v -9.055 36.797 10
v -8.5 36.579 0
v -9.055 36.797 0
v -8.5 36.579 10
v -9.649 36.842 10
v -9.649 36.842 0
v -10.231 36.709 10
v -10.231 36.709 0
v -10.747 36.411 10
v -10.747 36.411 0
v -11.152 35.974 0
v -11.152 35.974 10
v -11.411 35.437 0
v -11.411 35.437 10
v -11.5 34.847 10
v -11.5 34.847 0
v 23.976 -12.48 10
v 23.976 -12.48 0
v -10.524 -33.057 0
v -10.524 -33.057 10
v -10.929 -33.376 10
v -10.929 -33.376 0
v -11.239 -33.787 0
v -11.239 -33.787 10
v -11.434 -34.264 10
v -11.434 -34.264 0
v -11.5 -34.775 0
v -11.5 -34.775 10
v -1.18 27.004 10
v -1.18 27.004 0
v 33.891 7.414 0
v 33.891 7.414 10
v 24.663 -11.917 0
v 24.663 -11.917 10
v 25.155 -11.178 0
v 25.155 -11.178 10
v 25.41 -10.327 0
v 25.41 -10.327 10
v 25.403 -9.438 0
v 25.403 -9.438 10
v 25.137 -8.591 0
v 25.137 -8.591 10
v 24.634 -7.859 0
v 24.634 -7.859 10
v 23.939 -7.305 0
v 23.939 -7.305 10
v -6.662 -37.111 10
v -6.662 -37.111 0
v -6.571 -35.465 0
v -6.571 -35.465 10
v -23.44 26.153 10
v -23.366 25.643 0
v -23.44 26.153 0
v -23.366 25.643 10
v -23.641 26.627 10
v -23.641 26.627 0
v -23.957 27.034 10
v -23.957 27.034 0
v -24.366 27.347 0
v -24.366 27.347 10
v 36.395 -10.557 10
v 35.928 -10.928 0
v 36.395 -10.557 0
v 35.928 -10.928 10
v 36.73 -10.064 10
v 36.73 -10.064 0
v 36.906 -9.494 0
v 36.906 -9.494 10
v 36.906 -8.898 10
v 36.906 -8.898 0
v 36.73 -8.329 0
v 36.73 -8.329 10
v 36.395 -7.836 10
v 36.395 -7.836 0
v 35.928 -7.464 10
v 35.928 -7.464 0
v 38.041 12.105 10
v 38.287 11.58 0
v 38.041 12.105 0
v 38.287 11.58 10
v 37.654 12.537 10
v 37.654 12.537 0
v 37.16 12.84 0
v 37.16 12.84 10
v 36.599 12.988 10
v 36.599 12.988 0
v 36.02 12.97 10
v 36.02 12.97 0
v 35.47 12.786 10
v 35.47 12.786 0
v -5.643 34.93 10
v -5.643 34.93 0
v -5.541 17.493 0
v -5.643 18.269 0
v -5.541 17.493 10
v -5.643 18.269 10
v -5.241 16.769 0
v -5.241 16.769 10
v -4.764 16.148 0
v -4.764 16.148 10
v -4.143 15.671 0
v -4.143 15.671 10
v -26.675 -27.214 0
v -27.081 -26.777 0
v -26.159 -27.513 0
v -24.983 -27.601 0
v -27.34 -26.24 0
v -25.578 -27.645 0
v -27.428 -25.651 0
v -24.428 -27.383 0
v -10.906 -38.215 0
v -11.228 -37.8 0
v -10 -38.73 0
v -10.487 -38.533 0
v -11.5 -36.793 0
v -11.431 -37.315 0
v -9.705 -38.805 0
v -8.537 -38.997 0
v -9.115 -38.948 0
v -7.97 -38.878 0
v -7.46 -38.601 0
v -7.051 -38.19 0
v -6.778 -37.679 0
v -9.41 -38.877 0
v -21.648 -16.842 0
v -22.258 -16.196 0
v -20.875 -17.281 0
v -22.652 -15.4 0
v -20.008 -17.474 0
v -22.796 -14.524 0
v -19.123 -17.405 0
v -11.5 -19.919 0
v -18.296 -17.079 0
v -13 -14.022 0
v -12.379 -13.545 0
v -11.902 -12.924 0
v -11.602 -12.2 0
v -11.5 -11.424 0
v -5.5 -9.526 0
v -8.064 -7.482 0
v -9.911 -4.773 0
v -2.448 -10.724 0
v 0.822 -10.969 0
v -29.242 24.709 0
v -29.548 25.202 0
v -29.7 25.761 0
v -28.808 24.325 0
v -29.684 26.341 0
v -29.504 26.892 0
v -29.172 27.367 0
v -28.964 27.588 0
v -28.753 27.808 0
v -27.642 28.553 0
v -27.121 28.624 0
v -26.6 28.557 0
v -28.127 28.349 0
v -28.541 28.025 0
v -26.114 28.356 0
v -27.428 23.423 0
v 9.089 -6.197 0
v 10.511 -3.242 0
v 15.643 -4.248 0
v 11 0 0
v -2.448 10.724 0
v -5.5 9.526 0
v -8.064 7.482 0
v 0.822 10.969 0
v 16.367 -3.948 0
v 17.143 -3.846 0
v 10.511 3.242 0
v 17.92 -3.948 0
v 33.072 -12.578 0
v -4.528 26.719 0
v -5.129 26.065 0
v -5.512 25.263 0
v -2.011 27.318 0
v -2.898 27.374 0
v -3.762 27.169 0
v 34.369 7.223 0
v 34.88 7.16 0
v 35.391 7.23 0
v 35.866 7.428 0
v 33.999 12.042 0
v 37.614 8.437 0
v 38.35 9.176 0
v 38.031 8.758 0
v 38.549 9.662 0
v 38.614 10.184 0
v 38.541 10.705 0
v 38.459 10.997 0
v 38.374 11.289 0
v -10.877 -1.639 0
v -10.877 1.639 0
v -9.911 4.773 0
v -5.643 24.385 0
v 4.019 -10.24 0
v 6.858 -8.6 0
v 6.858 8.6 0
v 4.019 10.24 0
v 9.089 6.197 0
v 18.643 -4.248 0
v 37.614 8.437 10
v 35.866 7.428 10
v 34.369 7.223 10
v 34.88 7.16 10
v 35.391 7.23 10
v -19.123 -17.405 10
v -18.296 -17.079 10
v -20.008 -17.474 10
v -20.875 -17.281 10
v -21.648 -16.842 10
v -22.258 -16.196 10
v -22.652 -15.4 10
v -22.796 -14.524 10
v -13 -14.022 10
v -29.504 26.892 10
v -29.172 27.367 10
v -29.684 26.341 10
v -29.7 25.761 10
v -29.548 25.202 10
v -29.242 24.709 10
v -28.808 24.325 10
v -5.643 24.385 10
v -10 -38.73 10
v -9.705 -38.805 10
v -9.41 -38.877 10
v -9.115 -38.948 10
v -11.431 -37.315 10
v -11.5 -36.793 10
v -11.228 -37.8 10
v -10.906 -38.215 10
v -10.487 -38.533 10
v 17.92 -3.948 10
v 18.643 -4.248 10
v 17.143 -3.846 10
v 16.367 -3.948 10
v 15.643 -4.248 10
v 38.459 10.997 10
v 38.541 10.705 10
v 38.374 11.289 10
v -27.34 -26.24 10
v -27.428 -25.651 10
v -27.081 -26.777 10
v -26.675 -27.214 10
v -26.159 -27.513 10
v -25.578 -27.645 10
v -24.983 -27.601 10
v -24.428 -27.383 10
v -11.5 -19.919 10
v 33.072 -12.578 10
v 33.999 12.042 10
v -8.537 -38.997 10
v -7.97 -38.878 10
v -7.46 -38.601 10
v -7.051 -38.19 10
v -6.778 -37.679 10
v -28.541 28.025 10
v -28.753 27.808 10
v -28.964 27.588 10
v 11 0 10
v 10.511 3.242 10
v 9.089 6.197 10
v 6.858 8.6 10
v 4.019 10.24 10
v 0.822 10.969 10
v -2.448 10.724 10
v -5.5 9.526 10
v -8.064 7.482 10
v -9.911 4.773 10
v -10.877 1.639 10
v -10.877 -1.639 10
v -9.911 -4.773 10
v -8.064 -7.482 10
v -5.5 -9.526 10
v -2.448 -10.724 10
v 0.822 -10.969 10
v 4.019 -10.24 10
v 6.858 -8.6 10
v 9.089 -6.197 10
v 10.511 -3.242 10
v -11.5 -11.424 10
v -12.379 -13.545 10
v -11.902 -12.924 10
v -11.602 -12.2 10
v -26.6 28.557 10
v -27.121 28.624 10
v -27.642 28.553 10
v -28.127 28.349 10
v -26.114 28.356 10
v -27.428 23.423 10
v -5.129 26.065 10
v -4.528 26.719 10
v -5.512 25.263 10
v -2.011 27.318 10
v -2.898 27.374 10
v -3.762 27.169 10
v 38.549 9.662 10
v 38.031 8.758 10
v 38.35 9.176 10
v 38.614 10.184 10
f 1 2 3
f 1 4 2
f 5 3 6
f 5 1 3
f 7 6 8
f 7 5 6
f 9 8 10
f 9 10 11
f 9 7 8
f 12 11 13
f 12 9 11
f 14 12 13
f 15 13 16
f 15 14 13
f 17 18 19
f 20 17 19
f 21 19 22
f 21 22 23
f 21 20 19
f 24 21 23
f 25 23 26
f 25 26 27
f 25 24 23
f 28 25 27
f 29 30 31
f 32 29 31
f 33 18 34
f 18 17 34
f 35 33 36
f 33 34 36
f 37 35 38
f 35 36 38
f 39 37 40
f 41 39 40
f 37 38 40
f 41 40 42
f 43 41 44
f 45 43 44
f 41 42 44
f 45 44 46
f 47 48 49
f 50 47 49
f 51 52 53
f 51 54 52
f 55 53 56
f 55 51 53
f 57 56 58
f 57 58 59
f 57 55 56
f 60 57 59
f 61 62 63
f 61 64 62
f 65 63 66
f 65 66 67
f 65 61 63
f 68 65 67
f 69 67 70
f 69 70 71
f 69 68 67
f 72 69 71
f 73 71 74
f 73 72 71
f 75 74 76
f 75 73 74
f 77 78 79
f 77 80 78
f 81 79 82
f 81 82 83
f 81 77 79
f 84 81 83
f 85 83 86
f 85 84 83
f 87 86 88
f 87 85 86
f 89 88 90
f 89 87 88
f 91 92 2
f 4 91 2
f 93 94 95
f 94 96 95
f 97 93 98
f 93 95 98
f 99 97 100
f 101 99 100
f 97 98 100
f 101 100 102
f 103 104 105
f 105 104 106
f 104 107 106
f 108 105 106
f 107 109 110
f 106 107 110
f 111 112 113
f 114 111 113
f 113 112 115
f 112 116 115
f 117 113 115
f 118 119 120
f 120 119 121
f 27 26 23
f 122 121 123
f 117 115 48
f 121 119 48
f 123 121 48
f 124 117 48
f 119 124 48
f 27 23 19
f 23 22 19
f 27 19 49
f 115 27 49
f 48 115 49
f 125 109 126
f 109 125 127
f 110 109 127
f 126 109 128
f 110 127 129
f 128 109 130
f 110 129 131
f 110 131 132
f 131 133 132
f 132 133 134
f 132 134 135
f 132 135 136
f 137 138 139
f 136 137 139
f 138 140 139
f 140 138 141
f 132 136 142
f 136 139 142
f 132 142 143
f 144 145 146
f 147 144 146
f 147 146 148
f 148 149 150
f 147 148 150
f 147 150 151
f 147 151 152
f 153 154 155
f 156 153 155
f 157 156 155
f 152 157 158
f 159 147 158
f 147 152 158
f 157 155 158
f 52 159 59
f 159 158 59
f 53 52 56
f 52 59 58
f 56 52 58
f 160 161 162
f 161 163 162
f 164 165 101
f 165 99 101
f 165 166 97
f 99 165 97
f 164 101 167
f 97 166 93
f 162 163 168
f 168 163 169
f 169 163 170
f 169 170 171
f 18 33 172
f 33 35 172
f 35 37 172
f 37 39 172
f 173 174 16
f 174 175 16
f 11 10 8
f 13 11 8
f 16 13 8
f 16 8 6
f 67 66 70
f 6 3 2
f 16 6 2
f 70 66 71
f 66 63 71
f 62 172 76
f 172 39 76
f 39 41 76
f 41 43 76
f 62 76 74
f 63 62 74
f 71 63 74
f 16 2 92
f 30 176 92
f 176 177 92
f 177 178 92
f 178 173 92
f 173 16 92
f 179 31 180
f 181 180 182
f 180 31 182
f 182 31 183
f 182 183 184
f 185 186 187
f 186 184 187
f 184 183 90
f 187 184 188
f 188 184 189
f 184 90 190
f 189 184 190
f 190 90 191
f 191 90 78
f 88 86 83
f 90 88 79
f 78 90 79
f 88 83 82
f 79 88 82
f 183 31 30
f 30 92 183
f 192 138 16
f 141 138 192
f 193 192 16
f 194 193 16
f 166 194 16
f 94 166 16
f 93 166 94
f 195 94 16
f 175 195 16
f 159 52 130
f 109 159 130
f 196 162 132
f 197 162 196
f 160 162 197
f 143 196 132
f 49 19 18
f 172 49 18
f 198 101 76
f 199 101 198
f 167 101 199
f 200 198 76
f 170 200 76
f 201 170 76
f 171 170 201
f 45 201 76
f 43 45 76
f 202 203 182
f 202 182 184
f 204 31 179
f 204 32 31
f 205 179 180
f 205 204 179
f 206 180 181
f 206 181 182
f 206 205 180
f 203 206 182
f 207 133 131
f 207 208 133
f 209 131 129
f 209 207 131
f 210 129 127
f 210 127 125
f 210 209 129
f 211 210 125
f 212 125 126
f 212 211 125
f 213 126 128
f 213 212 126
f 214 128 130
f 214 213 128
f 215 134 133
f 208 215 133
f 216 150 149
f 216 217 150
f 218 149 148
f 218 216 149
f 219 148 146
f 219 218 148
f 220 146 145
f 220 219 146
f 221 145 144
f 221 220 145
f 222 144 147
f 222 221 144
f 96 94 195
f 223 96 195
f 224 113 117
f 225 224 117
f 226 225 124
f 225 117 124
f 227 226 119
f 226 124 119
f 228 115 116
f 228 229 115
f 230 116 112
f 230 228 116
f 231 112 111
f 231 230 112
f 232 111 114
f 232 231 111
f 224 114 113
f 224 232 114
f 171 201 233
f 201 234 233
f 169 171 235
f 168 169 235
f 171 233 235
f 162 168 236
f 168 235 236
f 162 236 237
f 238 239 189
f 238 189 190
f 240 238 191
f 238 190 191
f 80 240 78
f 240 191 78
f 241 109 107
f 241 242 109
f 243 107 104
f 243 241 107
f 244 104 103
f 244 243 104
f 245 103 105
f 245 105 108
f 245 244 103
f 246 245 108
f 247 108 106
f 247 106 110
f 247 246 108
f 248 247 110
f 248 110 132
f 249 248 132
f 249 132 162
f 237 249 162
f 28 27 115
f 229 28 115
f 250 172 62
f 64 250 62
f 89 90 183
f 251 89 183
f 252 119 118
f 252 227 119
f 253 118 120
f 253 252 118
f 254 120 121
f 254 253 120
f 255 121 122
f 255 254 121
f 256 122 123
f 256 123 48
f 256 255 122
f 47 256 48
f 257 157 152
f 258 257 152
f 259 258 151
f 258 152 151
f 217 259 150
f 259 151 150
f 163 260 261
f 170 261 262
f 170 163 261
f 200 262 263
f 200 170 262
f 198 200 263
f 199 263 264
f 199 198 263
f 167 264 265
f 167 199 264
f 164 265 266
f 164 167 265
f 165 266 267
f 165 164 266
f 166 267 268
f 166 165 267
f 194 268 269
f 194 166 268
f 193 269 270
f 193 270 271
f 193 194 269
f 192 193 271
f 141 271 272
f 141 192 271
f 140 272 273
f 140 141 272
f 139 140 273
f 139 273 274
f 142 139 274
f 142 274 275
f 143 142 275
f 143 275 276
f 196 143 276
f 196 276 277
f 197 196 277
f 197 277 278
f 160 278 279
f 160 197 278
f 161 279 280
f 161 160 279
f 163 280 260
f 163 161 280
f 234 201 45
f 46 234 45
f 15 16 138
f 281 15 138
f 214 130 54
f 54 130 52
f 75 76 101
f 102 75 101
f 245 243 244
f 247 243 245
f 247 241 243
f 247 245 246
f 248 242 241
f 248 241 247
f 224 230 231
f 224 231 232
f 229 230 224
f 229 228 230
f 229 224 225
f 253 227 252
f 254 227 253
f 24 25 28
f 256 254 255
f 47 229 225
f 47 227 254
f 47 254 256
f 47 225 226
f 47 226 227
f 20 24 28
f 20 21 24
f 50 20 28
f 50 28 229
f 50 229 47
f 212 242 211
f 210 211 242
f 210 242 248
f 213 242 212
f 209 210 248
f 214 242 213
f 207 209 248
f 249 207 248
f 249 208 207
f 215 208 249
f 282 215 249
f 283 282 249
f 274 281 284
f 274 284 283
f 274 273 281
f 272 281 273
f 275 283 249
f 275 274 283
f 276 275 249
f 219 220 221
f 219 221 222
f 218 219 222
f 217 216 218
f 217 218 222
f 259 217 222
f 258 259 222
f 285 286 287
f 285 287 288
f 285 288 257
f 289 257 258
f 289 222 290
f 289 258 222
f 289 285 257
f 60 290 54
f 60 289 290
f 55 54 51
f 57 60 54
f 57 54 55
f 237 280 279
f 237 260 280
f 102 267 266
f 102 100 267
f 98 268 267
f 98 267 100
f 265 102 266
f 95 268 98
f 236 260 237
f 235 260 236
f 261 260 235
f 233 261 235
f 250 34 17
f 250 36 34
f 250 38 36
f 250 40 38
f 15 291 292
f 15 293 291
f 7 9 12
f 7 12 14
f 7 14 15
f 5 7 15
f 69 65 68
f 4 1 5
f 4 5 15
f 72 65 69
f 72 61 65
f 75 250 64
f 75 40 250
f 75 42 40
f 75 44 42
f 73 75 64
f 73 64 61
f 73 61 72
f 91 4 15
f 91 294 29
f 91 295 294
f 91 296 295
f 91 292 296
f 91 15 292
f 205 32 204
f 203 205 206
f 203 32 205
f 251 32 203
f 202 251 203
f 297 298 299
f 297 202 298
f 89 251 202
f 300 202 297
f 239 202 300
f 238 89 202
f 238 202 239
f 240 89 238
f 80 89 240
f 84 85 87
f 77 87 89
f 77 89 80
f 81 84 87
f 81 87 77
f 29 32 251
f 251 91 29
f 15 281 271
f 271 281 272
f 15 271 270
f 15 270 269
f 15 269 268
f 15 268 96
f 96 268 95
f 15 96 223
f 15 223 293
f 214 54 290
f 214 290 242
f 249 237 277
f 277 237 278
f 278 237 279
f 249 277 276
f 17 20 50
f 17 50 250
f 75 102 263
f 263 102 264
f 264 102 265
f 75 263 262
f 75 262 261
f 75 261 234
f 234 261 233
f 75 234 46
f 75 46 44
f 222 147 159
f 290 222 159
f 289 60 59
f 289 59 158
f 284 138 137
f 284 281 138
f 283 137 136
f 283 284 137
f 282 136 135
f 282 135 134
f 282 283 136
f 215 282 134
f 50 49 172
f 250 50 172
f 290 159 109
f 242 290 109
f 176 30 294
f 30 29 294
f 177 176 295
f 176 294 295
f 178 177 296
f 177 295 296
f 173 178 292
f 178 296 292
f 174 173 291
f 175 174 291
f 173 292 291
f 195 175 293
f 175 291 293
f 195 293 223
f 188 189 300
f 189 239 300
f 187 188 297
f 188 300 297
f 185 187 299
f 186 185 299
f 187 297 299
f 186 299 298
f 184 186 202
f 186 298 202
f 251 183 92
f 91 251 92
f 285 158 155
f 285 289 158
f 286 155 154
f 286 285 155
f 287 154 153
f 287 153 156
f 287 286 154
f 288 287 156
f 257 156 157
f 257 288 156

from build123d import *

# Parameters (mm, degrees)
F0_R     = 11
F1_DEPTH = 10
F2_R     = 2
F3_R     = 3


with BuildPart() as f1:
    # F0 (on Top) → F1 (new body)
    with BuildSketch(Plane.XY):
        with BuildLine():
            Line((33.9994544901, 12.0421032112), (38.9284945409, 9.196320611))
            ThreePointArc((38.9284945409, 9.196320611), (38.3009590814, 11.5341464117), (37.5331647861, 13.8297339504))
            Line((37.5331647861, 13.8297339504), (33.9994544901, 12.0421032112))
        make_face()
        with BuildLine():
            Line((-27.4284945409, 23.4233396976), (-27.4284945409, 29.114904898))
            ThreePointArc((-27.4284945409, 29.114904898), (-29.1393433442, 27.4025303479), (-30.7434833217, 25.589807214))
            Line((-30.7434833217, 25.589807214), (-27.4284945409, 23.4233396976))
        make_face()
        with BuildLine():
            ThreePointArc((-11.5, -38.311225509), (-9.1616157371, -38.9366767596), (-6.7896814644, -39.4195411644))
            Line((-6.7896814644, -39.4195411644), (-6.5709599492, -35.4654429088))
            Line((-6.5709599492, -35.4654429088), (-11.5, -38.311225509))
        make_face()
        Polygon((-5.6430600129, 34.9297196308), (-11.5, 38.311225509), (-11.5, 32.768458128), (-5.6430600129, 29.496919338), align=None)
        Polygon((-27.4284945409, -22.3518931417), (-27.4284945409, -29.114904898), (-22.6283171817, -26.3435212075), (-22.7235514736, -19.6354929953), align=None)
        Polygon((33.0715545538, -12.5778264891), (38.9284945409, -9.196320611), (34.1283171817, -6.4249369205), (28.3666114865, -9.8614263427), align=None)
        Polygon((34.8825001806, 6.8603646779), (38.9284945409, 9.196320611), (33.9994544901, 12.0421032112), (-5.6430600129, 34.9297196308), (-5.6430600129, 29.496919338), align=None)
        Polygon((-23.3825001806, 26.778948965), (-27.4284945409, 29.114904898), (-27.4284945409, 23.4233396976), (-27.4284945409, -22.3518931417), (-22.7235514736, -19.6354929953), align=None)
        Polygon((-6.5709599492, -35.4654429088), (33.0715545538, -12.5778264891), (28.3666114865, -9.8614263427), (-11.5, -33.6393136429), (-11.5, -38.311225509), align=None)
        Polygon((17.1430600129, -3.3815058782), (23, 0), (-5.6430600129, 16.5370784089), (-11.5, 19.918584287), (-11.5, -13.1555725307), (-11.5, -19.918584287), align=None)
        Circle(F0_R, mode=Mode.SUBTRACT)
        Polygon((-5.6430600129, 16.5370784089), (-5.6430600129, 29.496919338), (-11.5, 32.768458128), (-11.5, 19.918584287), align=None)
        Polygon((-22.6283171817, -26.3435212075), (-11.5, -19.918584287), (-11.5, -13.1555725307), (-22.7235514736, -19.6354929953), align=None)
        Polygon((28.3666114865, -9.8614263427), (34.1283171817, -6.4249369205), (23, 0), (17.1430600129, -3.3815058782), align=None)
    extrude(amount=F1_DEPTH)

    # F2
    f2_edges = [f1.edges().sort_by_distance(p)[0] for p in [
        (37.533165, 13.829734, 5),
        (-11.5, 38.311226, 5),
        (38.928495, -9.196321, 5),
        (38.928495, 9.196321, 5),
        (34.8825, 6.860365, 5),
        (-6.789681, -39.419541, 5),
        (-11.5, -33.639314, 5),
        (-11.5, -38.311226, 5),
        (-27.428495, -29.114905, 5),
        (-30.743483, 25.589807, 5),
        (-27.428495, 29.114905, 5),
        (-23.3825, 26.778949, 5),
    ]]
    fillet(f2_edges, radius=F2_R)

    # F3
    f3_edges = [f1.edges().sort_by_distance(p)[0] for p in [
        (28.366611, -9.861426, 5),
        (17.14306, -3.381506, 5),
        (-5.64306, 16.537078, 5),
        (-5.64306, 29.496919, 5),
        (-11.5, -13.155573, 5),
        (-22.723551, -19.635493, 5),
    ]]
    fillet(f3_edges, radius=F3_R)


solid = f1.part
